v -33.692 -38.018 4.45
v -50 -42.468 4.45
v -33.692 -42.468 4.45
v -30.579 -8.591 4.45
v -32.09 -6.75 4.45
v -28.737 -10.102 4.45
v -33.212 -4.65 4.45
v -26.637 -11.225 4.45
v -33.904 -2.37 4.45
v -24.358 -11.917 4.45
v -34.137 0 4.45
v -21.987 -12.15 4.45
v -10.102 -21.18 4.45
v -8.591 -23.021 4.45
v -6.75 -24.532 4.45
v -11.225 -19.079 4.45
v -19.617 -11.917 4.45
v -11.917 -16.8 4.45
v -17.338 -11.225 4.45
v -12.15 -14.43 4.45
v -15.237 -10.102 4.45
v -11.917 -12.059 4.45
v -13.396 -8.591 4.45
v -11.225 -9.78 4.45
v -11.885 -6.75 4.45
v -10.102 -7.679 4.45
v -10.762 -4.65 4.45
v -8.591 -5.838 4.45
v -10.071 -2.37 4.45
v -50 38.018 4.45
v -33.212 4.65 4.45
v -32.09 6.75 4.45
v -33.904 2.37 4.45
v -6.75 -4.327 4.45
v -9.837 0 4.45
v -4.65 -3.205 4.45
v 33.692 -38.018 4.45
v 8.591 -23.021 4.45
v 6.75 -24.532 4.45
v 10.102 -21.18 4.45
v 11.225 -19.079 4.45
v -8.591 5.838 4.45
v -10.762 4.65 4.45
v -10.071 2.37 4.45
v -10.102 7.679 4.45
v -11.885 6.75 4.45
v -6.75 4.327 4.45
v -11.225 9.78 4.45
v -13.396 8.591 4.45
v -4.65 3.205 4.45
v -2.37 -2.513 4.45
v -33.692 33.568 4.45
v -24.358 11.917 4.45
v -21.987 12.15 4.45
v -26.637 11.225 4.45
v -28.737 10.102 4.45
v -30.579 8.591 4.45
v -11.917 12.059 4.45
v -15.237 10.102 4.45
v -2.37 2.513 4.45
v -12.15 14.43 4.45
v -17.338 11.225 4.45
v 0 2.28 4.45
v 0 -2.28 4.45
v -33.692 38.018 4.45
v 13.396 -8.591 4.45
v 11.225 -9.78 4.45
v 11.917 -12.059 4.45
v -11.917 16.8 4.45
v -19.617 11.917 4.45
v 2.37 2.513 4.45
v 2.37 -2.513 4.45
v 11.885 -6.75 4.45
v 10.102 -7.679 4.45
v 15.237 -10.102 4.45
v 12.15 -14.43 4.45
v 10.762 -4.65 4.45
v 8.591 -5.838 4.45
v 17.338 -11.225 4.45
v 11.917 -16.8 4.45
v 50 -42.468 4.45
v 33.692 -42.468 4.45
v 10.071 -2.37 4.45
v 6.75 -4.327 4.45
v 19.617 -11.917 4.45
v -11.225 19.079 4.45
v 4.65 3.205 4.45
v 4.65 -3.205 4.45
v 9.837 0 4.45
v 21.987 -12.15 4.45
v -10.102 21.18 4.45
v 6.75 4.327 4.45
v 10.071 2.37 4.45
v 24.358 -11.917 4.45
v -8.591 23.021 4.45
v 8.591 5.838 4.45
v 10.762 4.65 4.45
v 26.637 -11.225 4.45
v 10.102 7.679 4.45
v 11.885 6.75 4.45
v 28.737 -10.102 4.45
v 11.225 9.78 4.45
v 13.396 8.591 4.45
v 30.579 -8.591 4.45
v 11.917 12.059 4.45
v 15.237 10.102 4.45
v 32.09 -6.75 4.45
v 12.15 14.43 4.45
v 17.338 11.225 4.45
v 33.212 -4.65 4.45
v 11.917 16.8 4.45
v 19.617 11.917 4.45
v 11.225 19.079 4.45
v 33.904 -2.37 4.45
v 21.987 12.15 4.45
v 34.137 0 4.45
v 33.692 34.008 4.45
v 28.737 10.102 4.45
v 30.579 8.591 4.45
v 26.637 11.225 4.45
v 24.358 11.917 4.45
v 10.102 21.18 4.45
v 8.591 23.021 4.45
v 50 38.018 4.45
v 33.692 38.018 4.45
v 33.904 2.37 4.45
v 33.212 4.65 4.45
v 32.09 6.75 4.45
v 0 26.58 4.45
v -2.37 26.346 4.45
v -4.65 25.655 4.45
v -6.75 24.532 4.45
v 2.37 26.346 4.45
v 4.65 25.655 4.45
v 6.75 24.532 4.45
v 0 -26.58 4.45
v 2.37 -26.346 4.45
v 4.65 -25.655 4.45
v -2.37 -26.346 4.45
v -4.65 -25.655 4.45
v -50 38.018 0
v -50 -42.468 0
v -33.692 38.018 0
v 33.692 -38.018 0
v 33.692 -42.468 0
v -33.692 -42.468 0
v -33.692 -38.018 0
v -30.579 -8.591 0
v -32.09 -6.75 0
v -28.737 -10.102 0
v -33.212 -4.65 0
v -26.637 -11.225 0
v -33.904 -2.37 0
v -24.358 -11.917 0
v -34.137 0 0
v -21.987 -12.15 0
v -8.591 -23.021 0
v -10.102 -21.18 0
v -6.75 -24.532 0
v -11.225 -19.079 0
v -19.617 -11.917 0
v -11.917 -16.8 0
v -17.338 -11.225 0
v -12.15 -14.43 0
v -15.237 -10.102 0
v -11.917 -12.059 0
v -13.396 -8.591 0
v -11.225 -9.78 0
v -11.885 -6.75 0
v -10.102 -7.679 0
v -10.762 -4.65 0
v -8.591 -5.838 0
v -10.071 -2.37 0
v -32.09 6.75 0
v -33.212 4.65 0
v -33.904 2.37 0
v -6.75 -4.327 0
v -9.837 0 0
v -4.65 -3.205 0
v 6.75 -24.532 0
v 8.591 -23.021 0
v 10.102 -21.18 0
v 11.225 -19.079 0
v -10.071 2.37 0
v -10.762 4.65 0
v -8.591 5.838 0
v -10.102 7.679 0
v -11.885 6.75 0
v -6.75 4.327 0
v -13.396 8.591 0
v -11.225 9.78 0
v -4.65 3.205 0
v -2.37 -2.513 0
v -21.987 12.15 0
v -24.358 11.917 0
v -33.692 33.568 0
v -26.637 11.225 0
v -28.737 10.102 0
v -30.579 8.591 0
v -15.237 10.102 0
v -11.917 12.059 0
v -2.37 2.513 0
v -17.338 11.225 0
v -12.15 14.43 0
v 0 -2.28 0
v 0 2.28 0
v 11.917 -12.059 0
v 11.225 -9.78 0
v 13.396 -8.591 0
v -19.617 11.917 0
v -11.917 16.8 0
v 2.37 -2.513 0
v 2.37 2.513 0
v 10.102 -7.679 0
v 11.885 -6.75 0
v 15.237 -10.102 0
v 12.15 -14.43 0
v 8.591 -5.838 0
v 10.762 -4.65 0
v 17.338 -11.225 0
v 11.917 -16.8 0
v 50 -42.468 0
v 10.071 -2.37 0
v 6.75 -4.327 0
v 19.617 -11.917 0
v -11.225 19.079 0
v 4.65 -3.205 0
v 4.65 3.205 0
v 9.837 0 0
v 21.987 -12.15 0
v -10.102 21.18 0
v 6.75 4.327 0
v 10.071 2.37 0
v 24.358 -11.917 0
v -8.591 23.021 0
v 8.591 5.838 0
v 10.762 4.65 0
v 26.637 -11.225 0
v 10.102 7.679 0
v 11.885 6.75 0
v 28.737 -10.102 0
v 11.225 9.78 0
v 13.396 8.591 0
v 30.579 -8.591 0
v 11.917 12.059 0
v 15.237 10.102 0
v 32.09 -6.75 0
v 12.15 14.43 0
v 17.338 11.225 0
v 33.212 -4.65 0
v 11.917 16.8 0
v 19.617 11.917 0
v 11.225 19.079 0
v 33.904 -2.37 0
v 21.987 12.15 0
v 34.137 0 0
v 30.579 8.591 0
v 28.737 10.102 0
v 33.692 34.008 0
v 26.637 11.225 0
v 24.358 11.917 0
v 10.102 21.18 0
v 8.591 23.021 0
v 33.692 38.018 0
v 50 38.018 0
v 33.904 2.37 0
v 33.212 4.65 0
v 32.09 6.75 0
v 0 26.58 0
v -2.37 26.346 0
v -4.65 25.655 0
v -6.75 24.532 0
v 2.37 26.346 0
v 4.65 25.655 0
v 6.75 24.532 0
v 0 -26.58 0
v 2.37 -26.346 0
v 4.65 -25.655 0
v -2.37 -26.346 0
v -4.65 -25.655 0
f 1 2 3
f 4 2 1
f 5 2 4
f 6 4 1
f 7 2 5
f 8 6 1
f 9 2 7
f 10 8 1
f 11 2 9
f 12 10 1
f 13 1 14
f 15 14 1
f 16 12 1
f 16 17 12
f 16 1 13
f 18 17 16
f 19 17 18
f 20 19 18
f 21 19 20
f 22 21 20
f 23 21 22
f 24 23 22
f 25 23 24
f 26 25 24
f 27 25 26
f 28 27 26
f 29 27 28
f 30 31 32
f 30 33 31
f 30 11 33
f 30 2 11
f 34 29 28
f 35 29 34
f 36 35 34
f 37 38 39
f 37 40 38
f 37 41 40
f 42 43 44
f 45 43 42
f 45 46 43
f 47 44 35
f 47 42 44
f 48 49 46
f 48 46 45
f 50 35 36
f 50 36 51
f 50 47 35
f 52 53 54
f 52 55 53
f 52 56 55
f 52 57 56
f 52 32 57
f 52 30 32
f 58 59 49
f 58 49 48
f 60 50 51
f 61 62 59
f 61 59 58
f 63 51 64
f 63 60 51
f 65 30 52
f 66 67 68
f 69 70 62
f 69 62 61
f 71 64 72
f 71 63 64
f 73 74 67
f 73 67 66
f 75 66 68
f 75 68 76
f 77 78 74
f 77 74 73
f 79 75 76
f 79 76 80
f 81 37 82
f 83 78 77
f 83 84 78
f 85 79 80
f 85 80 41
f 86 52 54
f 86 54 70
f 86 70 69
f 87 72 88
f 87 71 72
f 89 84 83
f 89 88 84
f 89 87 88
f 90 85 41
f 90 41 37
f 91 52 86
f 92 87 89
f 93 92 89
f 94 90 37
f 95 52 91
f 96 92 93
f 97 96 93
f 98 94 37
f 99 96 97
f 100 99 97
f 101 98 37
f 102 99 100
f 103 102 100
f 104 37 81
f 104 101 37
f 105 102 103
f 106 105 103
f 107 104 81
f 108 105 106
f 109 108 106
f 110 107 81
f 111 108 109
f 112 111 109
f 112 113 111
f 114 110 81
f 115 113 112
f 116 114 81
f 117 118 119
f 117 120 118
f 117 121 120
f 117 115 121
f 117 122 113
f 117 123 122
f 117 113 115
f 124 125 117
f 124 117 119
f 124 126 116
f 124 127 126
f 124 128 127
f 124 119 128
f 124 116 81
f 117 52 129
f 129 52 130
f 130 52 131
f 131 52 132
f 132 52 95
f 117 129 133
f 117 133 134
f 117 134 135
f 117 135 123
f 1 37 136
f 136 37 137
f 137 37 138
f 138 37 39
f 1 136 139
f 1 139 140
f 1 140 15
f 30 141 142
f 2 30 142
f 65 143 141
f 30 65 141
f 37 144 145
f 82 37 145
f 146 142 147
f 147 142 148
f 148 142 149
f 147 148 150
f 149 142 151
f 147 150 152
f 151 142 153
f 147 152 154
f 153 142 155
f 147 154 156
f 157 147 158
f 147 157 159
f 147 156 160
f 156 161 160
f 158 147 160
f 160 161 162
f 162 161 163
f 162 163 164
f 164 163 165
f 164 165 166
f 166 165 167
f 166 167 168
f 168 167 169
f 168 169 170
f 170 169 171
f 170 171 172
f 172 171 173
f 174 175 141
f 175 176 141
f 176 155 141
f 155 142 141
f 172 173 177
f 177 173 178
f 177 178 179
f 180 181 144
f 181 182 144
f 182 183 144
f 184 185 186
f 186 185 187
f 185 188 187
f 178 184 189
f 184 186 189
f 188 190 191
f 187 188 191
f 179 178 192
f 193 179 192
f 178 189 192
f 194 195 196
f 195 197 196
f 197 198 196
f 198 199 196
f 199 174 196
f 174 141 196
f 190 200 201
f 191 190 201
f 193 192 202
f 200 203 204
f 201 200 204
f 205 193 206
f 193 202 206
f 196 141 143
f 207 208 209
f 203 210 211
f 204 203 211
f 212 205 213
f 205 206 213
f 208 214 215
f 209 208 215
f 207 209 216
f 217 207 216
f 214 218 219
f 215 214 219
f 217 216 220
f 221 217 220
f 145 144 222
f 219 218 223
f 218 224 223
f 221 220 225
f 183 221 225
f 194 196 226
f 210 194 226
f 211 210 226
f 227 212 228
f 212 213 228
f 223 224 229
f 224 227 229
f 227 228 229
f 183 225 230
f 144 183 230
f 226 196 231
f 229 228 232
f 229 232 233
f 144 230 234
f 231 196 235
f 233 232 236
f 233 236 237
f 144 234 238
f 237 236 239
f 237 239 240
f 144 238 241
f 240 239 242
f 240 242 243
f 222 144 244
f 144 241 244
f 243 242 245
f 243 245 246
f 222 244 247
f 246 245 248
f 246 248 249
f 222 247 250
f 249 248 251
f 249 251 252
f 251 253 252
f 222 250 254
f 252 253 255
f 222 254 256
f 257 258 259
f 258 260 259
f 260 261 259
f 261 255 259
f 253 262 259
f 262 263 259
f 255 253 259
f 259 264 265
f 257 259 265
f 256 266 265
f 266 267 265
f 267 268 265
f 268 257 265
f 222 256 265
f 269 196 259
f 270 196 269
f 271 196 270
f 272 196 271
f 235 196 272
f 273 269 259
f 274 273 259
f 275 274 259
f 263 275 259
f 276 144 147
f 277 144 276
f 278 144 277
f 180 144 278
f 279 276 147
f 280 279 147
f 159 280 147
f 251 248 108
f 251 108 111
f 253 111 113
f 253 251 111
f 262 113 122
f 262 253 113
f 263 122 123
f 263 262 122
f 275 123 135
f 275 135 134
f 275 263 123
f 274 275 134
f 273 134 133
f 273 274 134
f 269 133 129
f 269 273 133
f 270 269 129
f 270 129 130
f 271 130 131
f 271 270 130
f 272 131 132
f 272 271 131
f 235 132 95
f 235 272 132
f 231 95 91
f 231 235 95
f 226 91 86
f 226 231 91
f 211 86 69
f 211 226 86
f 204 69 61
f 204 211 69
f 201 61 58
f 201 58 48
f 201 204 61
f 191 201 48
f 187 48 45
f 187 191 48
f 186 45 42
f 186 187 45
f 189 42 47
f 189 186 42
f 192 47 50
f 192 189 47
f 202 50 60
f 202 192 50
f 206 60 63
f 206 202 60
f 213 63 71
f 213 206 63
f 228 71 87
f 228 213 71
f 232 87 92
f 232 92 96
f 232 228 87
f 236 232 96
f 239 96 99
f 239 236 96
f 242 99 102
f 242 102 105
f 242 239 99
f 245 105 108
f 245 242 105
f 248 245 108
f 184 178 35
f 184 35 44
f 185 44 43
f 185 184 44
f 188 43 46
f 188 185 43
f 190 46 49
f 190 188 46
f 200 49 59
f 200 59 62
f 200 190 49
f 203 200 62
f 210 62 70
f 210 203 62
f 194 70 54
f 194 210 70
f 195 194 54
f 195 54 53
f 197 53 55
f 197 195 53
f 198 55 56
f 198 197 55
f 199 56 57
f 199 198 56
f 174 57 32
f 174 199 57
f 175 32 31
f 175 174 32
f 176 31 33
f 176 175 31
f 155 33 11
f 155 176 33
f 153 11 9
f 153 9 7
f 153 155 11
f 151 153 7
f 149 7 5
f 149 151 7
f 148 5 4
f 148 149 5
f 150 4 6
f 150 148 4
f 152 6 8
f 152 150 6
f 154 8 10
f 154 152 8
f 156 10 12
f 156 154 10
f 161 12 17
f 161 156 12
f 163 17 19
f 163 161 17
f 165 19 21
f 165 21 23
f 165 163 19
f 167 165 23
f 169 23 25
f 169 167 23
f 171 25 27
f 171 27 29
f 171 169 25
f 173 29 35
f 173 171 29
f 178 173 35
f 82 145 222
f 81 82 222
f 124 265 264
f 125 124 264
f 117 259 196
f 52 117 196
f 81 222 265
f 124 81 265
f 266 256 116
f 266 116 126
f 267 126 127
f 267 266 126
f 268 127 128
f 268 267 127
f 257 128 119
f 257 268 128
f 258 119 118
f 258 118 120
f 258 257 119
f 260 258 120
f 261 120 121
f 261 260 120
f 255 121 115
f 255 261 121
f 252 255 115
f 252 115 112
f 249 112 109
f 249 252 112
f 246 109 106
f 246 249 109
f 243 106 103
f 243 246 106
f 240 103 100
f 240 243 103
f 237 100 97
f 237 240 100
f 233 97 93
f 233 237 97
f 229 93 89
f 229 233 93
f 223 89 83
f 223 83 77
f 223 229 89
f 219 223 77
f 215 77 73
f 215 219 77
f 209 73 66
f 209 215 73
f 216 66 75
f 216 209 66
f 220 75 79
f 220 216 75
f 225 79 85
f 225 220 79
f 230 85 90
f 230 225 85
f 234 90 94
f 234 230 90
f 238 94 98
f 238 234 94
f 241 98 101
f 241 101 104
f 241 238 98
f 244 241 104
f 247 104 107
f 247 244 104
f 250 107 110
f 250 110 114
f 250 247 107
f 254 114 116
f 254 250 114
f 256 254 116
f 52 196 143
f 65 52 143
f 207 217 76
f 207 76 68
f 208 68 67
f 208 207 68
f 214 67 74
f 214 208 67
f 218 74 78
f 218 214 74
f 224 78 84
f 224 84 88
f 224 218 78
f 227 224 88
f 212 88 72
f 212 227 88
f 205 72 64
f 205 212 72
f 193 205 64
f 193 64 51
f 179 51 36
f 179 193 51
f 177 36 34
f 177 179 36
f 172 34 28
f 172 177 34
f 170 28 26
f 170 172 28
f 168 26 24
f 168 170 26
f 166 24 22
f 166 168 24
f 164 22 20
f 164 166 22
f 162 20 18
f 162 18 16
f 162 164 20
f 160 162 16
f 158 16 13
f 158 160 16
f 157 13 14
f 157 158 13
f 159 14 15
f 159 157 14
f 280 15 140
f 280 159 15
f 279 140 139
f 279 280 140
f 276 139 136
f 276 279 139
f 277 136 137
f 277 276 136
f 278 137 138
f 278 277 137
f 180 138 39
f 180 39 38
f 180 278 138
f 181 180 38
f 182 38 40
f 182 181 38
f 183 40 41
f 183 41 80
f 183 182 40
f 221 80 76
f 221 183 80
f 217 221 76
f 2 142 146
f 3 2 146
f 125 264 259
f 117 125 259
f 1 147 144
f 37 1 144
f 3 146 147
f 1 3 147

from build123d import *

# Parameters (mm, degrees)
F0_R     = 12.15
F1_DEPTH = 4.45


with BuildPart() as f1:
    # F0 (on Top) → F1 (new body)
    with BuildSketch(Plane.XY):
        Polygon((50, -33.5685), (50, -16.64242), (50, 16.64242), (50, 33.5685), (50, 34.008425), (50, 38.0185), (33.6925, 38.0185), (33.6925, 34.008425), (-33.6925, 33.5685), (-33.6925, 38.0185), (-50, 38.0185), (-50, 33.5685), (-50, 16.64242), (-50, -16.64242), (-50, -33.5685), (-50, -38.0185), (-50, -42.4685), (-33.6925, -42.4685), (-33.6925, -38.0185), (33.6925, -38.0185), (33.6925, -42.4685), (50, -42.4685), (50, -38.0185), align=None)
        with Locations((0, -14.429661)):
            Circle(F0_R, mode=Mode.SUBTRACT)
        with Locations((-21.987291, 0)):
            Circle(F0_R, mode=Mode.SUBTRACT)
        with Locations((21.987292, 0)):
            Circle(F0_R, mode=Mode.SUBTRACT)
        with Locations((0, 14.429661)):
            Circle(F0_R, mode=Mode.SUBTRACT)
    extrude(amount=F1_DEPTH)


solid = f1.part
